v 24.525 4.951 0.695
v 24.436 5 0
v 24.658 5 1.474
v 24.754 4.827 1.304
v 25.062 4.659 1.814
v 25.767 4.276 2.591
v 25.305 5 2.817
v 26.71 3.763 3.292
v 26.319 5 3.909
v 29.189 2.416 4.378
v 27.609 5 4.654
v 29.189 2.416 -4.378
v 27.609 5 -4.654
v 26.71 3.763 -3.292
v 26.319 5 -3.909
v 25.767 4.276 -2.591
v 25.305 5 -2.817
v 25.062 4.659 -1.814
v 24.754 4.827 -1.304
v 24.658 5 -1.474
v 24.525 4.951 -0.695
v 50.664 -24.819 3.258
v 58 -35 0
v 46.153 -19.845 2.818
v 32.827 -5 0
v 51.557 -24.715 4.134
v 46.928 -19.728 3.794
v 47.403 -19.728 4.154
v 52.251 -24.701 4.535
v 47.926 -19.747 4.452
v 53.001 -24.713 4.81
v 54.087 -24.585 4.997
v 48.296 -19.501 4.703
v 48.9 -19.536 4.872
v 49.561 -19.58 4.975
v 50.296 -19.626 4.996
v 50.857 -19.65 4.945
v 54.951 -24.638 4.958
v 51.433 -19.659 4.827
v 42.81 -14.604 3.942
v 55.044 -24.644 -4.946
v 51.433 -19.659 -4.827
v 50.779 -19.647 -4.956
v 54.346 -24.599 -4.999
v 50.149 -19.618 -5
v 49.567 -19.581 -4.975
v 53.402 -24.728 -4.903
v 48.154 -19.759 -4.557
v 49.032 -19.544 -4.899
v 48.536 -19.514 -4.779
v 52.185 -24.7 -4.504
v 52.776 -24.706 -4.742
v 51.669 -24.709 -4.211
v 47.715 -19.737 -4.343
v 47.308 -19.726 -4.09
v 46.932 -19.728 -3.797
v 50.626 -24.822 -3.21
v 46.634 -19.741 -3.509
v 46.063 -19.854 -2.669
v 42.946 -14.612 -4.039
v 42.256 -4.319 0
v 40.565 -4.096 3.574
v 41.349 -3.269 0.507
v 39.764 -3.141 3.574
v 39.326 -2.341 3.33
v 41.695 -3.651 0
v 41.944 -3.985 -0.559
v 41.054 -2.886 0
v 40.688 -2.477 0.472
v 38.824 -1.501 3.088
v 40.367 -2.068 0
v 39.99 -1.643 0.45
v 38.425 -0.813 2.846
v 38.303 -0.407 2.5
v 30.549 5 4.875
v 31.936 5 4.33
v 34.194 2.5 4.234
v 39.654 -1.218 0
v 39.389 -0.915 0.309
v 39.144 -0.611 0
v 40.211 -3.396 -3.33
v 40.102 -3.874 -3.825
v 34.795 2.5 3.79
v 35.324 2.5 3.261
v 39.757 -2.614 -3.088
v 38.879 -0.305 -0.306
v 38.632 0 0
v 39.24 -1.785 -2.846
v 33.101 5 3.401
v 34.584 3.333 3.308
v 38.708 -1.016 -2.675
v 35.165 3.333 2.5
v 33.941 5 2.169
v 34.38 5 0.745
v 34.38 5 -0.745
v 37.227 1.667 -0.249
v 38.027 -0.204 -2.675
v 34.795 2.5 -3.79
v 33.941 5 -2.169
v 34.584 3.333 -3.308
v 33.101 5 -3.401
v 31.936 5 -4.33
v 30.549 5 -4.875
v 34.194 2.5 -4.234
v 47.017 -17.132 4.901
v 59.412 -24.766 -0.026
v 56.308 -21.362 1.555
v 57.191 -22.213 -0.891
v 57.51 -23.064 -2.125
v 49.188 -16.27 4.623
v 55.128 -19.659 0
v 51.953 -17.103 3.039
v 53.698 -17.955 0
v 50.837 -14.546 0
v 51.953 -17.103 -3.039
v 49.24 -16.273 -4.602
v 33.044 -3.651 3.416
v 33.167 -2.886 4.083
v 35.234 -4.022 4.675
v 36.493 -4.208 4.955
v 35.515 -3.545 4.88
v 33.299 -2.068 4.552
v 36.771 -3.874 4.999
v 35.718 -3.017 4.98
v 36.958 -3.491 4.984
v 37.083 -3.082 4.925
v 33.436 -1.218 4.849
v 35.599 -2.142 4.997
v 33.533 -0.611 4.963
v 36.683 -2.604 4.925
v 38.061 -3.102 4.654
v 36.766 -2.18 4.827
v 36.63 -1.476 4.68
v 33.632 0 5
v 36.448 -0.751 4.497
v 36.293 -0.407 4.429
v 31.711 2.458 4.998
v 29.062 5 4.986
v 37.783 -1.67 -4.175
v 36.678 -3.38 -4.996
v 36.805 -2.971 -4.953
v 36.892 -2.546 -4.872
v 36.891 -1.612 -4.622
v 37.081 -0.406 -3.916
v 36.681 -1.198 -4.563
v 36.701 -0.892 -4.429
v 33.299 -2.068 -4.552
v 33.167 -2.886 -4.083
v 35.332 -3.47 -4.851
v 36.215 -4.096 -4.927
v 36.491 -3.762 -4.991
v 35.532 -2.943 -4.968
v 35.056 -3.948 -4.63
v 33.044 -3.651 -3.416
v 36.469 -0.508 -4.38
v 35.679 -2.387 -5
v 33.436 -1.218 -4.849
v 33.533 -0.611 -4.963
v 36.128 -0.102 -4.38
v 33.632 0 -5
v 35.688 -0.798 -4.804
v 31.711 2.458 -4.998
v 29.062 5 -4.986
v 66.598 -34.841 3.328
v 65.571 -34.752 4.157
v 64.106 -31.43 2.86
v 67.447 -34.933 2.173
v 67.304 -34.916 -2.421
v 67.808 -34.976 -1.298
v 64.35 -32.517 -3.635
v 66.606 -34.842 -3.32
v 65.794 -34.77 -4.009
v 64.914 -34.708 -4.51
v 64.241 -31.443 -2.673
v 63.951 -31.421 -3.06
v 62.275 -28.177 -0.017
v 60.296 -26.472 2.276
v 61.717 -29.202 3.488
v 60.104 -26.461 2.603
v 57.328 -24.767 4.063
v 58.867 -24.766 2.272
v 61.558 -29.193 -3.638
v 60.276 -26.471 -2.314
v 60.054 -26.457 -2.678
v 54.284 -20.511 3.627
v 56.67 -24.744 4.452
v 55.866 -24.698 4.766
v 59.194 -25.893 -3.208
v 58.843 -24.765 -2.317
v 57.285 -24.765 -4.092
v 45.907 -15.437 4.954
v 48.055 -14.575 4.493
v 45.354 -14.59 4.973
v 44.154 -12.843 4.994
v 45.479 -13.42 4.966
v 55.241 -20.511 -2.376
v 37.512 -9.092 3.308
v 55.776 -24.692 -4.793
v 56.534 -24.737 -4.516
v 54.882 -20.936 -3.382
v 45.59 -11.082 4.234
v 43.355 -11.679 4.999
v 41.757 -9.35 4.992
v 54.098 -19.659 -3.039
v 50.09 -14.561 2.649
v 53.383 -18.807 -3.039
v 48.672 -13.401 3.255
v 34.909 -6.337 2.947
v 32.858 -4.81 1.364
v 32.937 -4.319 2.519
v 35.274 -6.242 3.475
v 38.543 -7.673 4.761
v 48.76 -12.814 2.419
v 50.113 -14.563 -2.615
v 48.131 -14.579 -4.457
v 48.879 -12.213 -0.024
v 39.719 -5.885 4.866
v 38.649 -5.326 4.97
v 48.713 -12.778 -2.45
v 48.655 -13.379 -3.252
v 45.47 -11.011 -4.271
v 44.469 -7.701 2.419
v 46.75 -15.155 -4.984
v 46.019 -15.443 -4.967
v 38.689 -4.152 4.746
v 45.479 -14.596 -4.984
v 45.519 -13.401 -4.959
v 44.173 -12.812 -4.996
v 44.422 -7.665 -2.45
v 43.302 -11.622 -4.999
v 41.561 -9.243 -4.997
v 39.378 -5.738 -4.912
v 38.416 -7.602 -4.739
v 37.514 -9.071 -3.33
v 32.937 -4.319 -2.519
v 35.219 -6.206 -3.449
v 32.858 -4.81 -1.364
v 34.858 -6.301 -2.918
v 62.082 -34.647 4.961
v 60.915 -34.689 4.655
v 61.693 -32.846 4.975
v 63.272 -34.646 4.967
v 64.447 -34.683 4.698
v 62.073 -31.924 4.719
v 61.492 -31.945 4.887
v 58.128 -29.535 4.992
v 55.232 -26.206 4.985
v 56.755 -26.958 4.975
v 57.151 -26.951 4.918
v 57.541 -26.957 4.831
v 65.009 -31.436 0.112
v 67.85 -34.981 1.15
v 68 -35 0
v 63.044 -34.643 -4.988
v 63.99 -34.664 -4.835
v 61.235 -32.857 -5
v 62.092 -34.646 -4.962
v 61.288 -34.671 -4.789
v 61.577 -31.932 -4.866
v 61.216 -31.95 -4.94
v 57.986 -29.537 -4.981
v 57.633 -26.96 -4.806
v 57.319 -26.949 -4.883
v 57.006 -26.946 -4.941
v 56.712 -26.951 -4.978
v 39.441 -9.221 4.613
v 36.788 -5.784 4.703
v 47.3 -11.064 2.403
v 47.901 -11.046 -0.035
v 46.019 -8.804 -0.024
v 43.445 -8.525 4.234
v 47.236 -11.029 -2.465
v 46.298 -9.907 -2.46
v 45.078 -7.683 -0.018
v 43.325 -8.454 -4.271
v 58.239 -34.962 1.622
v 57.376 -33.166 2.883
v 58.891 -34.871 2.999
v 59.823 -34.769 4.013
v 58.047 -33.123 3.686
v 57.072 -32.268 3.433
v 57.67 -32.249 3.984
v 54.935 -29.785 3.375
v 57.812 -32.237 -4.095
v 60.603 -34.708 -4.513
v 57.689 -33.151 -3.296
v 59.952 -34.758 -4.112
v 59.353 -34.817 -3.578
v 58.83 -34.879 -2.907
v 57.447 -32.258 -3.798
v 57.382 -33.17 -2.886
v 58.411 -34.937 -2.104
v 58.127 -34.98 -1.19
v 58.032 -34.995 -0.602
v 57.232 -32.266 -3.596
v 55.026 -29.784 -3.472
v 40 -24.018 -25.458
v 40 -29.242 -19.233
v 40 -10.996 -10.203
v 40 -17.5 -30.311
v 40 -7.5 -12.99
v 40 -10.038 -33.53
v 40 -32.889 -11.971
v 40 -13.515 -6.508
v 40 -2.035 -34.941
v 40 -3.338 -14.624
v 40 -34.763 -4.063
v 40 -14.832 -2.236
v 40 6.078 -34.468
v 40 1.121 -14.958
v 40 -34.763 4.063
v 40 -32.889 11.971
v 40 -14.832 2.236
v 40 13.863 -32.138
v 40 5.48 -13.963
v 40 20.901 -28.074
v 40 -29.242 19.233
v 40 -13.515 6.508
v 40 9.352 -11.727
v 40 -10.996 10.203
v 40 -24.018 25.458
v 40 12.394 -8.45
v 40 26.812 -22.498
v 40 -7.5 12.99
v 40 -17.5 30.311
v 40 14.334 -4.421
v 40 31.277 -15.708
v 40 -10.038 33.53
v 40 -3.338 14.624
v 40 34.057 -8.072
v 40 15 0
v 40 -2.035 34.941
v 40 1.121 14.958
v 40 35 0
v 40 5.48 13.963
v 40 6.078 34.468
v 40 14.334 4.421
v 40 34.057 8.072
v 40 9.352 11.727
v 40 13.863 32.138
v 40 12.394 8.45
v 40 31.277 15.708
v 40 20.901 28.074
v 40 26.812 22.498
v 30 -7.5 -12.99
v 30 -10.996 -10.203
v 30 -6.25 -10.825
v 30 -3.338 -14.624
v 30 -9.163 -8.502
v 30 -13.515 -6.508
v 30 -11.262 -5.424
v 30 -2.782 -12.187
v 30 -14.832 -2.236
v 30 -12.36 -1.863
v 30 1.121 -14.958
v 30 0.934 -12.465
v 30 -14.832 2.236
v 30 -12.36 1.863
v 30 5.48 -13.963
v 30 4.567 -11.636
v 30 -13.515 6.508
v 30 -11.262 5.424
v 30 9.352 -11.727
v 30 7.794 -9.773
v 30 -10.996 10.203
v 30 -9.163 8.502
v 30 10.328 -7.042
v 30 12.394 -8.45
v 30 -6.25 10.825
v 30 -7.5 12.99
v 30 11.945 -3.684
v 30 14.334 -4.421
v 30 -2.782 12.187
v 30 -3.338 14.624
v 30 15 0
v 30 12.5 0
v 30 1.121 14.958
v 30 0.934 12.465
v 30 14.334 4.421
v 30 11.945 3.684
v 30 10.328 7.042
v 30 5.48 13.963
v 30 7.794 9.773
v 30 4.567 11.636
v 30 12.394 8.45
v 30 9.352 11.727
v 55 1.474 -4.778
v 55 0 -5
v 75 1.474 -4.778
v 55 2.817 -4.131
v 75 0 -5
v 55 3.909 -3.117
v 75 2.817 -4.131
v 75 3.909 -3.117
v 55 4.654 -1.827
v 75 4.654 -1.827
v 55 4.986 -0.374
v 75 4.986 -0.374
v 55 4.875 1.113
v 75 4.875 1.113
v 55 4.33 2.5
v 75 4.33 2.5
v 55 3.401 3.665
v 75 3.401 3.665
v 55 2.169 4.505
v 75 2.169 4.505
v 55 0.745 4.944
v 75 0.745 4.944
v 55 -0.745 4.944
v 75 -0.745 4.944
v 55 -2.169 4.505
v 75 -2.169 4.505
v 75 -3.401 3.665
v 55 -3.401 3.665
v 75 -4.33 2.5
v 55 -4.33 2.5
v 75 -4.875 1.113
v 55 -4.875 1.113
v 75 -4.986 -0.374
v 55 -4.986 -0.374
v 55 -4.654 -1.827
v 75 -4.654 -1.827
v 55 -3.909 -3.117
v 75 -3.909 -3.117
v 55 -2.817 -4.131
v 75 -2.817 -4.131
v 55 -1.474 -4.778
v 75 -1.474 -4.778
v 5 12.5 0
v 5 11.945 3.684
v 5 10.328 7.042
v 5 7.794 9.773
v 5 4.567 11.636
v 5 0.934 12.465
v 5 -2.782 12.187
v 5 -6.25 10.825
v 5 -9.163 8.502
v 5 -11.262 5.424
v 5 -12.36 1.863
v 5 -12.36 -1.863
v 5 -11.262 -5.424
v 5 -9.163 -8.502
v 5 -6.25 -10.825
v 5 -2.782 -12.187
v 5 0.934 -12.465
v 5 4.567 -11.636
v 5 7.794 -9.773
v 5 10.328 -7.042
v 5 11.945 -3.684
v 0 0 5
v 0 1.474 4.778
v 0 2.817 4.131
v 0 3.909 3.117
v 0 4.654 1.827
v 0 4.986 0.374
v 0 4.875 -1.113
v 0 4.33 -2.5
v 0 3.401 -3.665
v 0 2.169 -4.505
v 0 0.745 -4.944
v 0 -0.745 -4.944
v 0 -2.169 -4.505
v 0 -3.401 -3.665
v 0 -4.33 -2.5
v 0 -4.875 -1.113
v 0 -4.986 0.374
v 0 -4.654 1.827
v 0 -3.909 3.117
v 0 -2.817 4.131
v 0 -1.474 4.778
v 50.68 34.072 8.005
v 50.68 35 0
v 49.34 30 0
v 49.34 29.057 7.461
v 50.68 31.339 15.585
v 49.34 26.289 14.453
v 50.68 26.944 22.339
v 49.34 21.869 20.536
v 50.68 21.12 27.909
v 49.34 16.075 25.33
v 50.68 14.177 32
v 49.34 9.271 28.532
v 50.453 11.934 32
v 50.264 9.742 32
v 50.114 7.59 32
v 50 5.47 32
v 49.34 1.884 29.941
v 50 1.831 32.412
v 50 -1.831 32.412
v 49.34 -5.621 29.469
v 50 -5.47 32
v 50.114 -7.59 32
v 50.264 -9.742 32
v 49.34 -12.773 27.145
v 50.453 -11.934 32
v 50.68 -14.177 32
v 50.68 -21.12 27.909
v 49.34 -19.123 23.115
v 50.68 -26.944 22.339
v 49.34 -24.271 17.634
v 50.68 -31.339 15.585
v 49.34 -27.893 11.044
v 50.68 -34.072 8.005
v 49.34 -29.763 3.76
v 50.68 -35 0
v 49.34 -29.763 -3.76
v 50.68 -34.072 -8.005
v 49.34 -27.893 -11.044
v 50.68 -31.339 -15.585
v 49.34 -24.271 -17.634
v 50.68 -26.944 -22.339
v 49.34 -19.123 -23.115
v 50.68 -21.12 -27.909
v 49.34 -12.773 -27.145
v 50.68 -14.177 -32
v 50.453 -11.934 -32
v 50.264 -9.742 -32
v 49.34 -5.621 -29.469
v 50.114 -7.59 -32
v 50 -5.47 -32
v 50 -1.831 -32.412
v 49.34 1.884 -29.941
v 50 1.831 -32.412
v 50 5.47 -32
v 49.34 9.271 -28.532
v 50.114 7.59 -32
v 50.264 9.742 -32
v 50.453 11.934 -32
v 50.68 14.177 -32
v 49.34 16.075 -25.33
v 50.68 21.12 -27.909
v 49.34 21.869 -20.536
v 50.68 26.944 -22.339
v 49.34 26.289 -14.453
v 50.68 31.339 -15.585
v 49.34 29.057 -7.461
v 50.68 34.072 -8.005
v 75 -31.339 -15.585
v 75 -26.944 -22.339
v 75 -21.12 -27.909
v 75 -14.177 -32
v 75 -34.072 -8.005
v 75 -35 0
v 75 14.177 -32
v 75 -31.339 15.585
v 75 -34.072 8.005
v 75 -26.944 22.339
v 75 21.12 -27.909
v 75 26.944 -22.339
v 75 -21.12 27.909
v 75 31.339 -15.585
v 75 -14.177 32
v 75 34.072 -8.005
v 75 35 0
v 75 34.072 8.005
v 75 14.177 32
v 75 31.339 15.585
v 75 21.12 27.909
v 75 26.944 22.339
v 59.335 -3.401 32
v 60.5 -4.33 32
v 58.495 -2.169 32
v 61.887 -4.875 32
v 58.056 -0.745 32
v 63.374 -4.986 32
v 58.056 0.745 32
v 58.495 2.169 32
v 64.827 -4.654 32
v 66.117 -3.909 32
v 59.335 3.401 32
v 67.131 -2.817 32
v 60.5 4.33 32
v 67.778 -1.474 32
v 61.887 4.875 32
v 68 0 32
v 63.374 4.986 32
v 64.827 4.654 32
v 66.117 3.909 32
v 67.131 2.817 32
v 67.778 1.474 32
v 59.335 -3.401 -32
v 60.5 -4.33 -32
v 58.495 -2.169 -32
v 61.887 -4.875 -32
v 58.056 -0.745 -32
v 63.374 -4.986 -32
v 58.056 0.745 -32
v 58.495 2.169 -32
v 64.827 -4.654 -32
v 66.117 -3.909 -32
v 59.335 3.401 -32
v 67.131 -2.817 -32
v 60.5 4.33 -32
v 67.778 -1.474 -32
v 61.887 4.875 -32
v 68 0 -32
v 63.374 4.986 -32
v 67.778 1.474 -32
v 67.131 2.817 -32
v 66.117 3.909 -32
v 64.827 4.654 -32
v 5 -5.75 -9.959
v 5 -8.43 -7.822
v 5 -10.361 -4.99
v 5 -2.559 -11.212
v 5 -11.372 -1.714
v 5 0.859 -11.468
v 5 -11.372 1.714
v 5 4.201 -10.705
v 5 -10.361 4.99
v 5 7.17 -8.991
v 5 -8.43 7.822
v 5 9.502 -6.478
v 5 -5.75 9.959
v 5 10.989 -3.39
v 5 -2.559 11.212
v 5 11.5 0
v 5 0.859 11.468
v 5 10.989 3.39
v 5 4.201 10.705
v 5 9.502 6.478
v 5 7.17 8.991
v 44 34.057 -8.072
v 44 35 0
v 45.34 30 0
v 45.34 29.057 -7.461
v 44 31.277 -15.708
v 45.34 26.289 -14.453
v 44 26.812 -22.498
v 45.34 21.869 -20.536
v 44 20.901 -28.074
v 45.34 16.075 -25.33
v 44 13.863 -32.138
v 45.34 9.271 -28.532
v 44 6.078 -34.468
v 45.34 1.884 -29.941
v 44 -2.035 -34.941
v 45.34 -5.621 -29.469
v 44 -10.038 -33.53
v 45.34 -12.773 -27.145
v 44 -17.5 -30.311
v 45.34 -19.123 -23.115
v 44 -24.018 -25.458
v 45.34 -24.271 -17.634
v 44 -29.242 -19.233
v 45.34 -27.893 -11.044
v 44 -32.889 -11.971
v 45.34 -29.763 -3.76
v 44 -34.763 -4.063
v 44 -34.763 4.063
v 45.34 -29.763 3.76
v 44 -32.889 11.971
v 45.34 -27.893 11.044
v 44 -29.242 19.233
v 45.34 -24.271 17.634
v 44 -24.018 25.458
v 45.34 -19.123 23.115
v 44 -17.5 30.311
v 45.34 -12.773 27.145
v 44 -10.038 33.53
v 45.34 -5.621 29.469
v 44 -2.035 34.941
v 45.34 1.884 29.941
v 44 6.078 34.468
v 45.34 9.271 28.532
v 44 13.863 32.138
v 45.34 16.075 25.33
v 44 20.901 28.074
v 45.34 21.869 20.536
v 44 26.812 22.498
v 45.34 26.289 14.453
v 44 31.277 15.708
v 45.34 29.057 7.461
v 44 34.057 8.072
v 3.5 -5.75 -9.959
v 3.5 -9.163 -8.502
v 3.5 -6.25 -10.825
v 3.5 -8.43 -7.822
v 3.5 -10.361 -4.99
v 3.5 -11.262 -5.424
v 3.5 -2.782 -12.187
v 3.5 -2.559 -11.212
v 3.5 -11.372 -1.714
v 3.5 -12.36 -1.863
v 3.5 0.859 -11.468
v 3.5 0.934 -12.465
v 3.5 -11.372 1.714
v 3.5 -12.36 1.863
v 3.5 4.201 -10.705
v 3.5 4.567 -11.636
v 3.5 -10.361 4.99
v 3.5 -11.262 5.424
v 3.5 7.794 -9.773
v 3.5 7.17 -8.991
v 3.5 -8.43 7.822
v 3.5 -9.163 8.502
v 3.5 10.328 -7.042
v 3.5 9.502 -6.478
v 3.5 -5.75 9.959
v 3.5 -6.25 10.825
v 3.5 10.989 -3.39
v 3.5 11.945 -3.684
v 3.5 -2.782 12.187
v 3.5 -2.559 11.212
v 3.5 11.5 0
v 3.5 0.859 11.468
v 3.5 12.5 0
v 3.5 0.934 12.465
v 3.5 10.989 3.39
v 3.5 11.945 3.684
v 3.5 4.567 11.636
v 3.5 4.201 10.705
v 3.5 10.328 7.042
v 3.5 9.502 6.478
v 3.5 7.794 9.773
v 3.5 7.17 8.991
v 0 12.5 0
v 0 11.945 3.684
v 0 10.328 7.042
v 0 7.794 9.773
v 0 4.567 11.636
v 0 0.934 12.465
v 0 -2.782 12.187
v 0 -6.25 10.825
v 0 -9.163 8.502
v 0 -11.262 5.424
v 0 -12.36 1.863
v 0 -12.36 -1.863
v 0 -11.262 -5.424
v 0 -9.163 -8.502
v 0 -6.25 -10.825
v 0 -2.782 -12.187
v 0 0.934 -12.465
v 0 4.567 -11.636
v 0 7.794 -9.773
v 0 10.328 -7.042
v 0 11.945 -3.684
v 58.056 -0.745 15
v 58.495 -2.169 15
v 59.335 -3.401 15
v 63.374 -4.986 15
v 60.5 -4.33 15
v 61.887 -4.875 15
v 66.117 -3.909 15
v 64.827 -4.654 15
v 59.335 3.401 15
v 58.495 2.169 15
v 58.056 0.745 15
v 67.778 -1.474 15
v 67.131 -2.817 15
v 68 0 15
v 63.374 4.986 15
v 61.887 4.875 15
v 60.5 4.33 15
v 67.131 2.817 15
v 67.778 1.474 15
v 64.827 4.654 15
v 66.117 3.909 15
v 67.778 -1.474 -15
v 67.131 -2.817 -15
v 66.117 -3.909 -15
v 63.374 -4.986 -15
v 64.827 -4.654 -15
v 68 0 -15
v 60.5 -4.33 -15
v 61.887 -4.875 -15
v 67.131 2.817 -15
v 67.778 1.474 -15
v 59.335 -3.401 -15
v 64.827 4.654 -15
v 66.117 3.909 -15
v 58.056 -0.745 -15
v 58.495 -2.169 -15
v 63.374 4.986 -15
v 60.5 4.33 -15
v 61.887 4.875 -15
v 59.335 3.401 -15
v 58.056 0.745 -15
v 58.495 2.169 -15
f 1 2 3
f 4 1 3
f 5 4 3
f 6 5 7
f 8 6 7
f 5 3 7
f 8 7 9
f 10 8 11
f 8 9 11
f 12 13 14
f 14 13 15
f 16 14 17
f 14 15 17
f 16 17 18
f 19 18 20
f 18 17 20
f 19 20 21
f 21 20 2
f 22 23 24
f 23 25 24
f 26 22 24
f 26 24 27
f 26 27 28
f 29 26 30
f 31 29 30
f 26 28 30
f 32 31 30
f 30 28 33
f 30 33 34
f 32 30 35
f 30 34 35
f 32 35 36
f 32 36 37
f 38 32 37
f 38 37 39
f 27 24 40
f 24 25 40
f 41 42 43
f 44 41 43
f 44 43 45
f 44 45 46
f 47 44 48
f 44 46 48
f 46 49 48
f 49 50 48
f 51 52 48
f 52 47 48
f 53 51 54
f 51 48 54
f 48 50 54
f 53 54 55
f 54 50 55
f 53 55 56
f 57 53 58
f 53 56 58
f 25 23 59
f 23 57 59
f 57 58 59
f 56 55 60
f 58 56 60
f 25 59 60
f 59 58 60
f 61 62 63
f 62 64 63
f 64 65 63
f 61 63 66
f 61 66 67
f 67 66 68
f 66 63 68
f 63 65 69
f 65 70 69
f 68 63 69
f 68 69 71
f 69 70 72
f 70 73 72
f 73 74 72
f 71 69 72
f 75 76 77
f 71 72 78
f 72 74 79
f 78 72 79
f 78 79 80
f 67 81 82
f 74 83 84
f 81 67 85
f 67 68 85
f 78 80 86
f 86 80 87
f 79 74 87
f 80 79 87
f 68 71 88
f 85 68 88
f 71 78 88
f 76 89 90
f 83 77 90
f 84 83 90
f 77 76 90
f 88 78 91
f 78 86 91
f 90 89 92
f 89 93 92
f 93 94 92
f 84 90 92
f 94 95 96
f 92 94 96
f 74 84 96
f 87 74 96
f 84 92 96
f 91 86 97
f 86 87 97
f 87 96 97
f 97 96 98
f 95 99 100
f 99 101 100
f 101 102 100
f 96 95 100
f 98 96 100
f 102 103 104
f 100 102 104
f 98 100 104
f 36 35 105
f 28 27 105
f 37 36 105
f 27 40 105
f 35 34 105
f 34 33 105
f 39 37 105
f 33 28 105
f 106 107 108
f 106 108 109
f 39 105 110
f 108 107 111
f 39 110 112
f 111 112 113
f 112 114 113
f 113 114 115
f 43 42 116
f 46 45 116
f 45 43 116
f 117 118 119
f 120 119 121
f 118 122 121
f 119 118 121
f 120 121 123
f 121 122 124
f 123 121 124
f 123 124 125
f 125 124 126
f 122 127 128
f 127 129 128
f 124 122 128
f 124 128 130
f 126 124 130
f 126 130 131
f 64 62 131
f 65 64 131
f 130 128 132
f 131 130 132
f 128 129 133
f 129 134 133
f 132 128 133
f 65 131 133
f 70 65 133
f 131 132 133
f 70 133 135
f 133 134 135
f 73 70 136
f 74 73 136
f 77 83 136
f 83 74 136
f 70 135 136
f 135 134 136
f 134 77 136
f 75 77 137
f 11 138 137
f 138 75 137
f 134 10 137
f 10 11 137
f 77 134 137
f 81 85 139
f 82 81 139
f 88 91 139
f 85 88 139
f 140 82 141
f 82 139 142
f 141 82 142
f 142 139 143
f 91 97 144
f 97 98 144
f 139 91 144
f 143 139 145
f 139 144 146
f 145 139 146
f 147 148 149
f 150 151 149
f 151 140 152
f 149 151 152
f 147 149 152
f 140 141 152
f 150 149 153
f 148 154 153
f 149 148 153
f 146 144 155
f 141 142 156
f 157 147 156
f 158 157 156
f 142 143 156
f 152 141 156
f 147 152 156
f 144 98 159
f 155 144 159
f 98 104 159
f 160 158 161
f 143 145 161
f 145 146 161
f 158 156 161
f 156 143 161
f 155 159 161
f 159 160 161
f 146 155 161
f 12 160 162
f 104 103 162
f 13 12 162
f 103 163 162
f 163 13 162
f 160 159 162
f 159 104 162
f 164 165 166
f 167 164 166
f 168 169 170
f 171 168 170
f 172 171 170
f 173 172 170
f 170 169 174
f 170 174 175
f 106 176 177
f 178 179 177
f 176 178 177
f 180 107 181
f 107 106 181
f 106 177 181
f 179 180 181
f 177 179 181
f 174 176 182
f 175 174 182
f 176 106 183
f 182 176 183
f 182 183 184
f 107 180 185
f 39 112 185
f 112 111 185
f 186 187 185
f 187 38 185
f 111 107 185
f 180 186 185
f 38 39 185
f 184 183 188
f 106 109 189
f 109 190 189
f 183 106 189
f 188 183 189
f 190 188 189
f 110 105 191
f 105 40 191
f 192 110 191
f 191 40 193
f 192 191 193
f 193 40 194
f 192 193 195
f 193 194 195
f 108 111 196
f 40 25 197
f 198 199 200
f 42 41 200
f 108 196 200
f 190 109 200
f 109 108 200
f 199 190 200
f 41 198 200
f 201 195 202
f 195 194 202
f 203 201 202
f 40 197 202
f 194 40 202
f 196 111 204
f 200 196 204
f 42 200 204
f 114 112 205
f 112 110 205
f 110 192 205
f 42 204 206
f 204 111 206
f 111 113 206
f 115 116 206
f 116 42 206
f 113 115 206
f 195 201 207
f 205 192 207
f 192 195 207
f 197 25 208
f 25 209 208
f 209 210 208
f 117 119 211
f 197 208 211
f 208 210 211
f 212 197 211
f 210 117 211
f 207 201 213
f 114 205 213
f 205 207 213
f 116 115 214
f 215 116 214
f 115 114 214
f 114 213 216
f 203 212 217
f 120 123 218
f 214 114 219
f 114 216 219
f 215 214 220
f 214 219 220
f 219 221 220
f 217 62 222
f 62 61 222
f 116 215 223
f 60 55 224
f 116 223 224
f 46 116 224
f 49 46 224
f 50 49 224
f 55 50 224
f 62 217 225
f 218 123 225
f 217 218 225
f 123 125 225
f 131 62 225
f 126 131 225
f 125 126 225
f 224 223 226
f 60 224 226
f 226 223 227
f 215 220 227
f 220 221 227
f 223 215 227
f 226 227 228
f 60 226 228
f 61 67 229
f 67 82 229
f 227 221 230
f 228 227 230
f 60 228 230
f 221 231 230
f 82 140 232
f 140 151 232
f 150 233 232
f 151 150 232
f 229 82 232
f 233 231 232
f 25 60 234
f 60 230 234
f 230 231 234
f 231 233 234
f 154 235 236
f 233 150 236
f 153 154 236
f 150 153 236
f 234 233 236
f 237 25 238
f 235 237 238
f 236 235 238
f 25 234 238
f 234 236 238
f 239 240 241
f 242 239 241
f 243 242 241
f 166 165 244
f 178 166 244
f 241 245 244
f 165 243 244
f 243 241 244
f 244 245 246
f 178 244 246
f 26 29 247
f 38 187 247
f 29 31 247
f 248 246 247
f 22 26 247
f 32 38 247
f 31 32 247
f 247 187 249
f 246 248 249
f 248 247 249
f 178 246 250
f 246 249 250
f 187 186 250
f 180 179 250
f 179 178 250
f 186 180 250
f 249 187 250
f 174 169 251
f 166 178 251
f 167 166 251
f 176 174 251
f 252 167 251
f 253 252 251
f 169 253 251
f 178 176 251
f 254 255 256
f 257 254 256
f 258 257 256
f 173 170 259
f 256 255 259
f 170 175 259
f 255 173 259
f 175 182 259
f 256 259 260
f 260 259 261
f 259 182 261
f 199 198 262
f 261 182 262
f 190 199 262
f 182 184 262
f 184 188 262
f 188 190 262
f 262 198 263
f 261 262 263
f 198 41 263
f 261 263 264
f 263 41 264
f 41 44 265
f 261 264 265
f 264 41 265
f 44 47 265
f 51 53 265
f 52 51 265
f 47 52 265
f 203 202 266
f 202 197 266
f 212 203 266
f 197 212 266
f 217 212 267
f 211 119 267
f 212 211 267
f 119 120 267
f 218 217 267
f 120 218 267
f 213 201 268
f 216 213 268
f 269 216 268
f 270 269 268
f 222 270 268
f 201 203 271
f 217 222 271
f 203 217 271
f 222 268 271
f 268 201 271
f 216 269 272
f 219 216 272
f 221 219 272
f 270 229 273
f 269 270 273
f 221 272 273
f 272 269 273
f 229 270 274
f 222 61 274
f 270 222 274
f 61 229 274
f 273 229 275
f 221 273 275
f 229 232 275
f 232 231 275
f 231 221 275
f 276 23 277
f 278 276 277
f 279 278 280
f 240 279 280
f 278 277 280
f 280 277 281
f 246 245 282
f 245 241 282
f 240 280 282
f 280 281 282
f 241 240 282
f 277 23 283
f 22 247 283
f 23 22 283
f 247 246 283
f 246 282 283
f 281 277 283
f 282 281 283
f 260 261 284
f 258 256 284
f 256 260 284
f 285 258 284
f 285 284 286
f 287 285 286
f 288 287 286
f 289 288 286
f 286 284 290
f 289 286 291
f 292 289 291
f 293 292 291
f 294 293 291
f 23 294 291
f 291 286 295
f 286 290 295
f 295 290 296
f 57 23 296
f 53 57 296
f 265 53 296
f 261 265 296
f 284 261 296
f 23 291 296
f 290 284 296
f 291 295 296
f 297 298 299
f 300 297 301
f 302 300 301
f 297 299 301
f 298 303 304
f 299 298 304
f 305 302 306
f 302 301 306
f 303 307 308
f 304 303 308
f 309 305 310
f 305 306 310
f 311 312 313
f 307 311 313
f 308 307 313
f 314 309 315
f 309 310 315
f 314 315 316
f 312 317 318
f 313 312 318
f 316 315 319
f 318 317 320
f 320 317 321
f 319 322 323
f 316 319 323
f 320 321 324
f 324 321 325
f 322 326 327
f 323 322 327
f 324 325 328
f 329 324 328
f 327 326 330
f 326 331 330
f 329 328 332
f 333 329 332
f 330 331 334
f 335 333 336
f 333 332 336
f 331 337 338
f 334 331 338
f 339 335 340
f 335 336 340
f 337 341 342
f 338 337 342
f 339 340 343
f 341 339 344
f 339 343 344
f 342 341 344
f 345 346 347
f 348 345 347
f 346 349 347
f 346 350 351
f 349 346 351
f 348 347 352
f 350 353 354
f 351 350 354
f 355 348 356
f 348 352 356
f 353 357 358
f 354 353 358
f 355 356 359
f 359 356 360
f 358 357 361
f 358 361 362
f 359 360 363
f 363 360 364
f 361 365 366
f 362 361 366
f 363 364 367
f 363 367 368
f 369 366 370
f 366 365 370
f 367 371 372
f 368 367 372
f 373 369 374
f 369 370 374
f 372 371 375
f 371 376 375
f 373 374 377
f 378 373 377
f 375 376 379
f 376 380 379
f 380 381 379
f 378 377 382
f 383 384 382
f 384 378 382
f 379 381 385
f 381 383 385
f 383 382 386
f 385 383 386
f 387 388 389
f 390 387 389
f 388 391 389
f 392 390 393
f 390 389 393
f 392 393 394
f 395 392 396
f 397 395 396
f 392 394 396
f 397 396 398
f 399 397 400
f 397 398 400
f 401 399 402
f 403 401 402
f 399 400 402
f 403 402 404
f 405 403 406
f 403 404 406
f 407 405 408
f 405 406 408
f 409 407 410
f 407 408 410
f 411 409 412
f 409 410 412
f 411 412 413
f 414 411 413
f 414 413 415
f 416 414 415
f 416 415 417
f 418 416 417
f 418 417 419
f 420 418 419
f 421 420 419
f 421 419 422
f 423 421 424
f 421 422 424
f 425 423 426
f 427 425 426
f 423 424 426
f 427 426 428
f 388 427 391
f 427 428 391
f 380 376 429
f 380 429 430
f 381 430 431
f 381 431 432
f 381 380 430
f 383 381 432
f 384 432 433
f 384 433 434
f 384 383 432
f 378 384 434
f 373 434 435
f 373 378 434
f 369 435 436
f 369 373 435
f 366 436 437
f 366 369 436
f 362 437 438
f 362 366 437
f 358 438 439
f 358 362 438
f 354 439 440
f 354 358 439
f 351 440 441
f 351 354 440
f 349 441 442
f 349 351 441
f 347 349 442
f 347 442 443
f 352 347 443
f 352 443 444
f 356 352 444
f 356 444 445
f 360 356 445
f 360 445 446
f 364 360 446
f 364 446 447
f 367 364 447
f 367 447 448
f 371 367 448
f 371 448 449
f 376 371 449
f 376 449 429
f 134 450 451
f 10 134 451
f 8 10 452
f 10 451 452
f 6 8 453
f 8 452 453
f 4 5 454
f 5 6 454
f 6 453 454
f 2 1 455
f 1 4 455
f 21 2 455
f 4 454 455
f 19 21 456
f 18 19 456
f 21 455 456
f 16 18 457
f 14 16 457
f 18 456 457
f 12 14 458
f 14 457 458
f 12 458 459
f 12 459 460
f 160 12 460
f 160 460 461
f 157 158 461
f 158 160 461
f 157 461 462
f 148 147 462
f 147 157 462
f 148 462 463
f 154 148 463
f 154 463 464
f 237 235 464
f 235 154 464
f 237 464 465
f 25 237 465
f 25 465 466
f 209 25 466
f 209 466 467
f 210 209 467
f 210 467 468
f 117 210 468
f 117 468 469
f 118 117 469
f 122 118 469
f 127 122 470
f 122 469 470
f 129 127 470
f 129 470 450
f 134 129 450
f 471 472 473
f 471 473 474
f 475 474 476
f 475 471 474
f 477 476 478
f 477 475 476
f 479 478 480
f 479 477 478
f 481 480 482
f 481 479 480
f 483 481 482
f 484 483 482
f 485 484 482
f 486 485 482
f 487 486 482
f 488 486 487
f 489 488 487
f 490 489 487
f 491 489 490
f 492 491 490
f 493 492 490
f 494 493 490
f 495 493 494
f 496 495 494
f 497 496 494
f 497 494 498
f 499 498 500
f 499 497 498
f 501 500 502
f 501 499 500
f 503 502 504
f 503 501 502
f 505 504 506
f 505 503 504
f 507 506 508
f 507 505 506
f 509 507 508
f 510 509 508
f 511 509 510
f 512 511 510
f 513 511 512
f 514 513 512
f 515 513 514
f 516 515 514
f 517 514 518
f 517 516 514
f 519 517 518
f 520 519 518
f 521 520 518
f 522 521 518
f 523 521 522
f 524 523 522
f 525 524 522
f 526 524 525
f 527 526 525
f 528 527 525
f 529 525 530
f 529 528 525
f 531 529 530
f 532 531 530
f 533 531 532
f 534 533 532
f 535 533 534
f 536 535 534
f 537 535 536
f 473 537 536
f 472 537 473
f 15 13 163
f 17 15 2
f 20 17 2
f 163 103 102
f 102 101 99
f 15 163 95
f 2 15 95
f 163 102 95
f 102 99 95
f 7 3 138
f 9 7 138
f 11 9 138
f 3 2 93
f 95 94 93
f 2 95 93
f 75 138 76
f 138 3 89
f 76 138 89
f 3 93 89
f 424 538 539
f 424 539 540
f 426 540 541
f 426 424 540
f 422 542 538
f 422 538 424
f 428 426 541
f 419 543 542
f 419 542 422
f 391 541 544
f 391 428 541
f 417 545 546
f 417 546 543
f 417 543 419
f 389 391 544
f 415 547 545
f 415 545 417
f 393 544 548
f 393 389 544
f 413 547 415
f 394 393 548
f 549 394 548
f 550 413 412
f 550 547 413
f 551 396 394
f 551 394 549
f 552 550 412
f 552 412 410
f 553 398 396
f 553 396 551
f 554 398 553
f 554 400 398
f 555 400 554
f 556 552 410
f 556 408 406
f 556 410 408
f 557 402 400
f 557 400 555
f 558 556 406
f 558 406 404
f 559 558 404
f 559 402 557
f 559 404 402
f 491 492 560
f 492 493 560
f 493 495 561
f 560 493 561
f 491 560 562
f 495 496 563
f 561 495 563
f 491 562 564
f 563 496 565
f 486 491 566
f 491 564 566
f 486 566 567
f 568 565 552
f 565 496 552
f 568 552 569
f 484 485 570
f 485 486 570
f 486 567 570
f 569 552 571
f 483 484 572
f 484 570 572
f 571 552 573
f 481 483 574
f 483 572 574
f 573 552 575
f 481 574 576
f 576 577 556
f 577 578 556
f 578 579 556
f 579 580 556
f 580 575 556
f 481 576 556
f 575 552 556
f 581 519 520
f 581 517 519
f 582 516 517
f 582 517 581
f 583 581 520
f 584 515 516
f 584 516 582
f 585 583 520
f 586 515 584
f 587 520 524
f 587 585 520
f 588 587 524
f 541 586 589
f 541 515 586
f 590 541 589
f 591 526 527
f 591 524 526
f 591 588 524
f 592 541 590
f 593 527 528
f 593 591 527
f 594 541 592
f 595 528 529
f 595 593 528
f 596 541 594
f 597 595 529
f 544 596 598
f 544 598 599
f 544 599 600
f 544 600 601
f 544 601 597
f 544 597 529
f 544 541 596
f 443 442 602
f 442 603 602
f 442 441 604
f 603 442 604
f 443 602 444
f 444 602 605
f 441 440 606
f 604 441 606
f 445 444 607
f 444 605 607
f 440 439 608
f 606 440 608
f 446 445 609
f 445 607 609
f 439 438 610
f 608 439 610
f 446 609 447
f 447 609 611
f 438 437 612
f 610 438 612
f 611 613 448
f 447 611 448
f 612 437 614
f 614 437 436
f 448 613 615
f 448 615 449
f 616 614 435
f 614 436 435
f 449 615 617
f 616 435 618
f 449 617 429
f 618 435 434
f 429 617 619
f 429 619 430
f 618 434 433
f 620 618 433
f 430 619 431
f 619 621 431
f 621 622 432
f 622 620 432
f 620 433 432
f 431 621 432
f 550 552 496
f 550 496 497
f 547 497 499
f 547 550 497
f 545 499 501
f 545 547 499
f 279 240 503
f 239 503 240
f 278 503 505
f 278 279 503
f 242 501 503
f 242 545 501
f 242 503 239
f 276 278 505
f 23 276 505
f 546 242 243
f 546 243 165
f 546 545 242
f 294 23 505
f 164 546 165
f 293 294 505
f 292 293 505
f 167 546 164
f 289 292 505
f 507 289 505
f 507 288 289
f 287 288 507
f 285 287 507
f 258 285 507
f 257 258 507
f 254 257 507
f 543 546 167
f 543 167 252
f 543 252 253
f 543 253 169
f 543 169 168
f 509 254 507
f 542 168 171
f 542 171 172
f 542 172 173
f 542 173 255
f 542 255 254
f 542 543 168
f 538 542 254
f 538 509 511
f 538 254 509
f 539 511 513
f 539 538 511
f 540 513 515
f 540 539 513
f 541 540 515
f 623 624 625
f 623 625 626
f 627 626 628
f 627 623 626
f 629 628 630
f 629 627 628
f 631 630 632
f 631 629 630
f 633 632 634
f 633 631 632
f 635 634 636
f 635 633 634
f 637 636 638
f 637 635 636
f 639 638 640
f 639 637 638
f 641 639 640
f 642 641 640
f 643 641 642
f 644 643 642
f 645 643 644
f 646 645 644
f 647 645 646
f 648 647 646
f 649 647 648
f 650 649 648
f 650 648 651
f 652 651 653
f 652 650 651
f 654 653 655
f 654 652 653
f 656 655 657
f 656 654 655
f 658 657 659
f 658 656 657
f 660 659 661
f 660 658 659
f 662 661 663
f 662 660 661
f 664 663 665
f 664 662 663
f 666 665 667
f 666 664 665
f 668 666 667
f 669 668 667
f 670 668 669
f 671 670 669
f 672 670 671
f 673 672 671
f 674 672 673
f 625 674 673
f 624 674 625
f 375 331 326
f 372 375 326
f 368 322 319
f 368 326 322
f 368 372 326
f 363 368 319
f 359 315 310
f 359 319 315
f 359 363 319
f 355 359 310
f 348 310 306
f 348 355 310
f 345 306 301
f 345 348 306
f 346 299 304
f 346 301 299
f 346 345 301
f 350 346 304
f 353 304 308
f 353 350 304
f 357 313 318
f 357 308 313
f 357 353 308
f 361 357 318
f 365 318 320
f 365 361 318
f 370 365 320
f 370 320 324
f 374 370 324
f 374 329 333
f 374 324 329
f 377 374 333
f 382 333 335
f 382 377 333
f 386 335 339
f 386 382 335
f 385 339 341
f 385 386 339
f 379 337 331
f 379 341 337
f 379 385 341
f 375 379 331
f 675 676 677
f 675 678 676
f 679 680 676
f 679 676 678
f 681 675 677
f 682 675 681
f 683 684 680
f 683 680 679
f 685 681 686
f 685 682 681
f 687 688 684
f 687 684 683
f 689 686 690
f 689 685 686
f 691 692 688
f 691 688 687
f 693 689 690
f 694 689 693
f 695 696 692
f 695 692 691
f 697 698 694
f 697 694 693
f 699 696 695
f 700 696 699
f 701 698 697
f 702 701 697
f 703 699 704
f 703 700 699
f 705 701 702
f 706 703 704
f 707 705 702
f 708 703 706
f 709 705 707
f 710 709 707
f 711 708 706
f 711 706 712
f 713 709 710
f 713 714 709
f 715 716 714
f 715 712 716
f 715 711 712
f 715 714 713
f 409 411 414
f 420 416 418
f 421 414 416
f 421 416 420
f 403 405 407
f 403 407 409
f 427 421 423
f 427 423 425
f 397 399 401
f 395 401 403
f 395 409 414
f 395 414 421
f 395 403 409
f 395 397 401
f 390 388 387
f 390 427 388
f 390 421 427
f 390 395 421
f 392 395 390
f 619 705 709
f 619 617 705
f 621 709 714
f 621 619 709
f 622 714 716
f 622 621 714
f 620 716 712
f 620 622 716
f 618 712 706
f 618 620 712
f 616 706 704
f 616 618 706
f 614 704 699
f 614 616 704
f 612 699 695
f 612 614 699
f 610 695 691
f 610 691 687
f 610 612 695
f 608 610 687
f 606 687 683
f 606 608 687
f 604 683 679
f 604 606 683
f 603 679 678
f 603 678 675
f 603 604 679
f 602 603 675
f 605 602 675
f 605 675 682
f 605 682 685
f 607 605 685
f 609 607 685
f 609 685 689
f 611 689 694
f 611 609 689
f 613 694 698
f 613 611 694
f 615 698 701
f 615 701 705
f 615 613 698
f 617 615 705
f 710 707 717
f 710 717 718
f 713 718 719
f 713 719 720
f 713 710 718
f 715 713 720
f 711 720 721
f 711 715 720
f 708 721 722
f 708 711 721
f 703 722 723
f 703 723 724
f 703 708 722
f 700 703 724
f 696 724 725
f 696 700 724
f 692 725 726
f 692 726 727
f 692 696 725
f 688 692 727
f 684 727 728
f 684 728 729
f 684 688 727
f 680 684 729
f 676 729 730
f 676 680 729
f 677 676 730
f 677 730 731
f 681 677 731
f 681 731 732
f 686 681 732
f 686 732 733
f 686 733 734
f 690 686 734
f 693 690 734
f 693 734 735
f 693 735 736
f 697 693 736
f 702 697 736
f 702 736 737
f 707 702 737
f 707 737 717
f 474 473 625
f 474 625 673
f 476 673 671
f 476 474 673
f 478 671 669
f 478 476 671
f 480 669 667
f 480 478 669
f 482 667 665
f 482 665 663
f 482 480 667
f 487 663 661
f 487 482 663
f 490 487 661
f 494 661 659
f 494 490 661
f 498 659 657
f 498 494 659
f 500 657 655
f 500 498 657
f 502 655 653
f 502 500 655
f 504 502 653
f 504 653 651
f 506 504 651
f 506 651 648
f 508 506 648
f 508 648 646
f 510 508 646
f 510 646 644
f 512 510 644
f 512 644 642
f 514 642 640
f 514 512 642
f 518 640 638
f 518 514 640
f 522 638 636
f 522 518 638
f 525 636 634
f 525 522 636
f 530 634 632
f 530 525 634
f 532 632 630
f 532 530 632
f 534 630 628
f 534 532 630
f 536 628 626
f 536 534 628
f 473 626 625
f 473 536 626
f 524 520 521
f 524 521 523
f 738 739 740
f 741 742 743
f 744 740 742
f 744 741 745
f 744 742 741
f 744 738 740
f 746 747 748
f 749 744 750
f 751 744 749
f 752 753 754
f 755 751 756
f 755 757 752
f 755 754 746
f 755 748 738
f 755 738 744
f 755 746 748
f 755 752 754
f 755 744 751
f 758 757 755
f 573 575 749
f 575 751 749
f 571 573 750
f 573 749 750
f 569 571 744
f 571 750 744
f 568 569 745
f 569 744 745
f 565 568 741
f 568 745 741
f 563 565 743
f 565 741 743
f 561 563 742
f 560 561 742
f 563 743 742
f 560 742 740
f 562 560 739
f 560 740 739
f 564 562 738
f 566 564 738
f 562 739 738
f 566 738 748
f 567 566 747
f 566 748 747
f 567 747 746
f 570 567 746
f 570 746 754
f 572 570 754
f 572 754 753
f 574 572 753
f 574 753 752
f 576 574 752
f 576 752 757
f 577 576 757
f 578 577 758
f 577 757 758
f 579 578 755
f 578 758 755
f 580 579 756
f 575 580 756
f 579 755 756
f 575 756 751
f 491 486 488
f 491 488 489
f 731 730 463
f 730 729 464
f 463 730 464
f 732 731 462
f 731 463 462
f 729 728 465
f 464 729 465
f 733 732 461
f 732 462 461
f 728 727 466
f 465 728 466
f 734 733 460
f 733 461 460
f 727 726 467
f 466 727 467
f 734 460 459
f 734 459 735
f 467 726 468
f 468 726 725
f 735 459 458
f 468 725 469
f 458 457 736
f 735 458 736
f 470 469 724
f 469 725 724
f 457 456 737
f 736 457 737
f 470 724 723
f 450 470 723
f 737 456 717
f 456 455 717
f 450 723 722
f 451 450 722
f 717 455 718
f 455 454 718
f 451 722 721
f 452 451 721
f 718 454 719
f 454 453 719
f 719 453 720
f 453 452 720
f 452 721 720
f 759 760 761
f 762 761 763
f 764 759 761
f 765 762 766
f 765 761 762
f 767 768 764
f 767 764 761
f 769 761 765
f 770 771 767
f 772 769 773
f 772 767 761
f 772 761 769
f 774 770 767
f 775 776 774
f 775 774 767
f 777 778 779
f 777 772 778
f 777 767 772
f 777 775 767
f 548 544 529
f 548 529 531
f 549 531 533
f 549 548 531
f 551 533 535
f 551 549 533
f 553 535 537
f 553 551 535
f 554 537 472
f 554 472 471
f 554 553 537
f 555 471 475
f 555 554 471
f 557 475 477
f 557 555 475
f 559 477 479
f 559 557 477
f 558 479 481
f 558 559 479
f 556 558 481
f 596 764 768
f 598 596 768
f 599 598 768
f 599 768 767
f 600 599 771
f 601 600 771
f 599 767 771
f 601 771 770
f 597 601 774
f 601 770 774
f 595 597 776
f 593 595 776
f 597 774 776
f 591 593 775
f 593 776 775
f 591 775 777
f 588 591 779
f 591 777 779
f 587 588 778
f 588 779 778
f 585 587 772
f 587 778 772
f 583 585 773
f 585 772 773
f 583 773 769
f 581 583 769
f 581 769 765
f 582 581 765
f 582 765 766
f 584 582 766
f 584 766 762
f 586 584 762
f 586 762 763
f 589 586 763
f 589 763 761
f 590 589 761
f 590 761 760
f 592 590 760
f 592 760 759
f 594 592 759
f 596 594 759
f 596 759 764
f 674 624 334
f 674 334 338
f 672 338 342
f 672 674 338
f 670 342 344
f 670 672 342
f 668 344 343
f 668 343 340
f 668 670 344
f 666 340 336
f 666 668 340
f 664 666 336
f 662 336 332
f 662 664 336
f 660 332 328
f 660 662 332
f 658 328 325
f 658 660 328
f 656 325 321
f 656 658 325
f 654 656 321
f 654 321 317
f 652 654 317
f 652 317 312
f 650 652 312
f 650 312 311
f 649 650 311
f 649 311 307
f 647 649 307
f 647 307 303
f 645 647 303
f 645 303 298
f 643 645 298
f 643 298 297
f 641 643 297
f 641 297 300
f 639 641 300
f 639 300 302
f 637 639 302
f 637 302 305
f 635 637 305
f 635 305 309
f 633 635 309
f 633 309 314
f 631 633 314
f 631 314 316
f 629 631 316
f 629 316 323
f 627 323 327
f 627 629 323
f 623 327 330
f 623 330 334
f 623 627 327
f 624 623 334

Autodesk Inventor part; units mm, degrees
ref_plane "YZ Plane" through (0, 0, 0) normal (1, 0, 0) x (0, 1, 0)
sketch "Boceto1" plane through (0, 0, 0) normal (0, 0, 1) x (1, 0, 0)
  line L0 (40, 35) -> (44, 35)
  line L1 (75, 35) -> (75, 0)
  line L2 (40, 12.5) -> (40, 15) construction
  line L3 (0, 0) -> (75, 0)
  line L4 (40, 15) -> (30, 15)
  line L5 (30, 15) -> (30, 12.5)
  line L6 (30, 12.5) -> (40, 12.5) construction
  line L7 (40, 15) -> (40, 35)
  line L8 (3.5, 12.5) -> (3.5, 11.5)
  line L9 (3.5, 11.5) -> (5, 11.5)
  line L10 (5, 11.5) -> (5, 12.5)
  line L11 (5, 12.5) -> (30, 12.5)
  line L12 (3.5, 12.5) -> (5, 12.5) construction
  line L13 (0, 12.5) -> (0, 0)
  line L14 (0, 12.5) -> (3.5, 12.5)
  line L15 (65, 35) -> (65, 0) construction
  line L16 (44, 35) -> (45.3397, 30)
  line L17 (45.3397, 30) -> (49.3397, 30)
  line L18 (49.3397, 30) -> (50.6795, 35)
  line L19 (47.3397, 30) -> (47.3397, 35) construction
  line L20 (47.3397, 35) -> (50.6795, 35) construction
  line L21 (44, 35) -> (47.3397, 35) construction
  line L22 (50.6795, 35) -> (75, 35)
  dimension "d59" = 75
  dimension "d61" = 35
  dimension "d82" = 35
  dimension "d111" = 10
  dimension "d112" = 15
  dimension "d113" = 1.5
  dimension "d114" = 1
  dimension "d115" = 25
  dimension "d130" = 12.5
  dimension "d133" = 10
  dimension "d134" = 2
  dimension "d135" = 105
  dimension "d136" = 105
  dimension "d137" = 5
  dimension "d138" = 4
revolve "Revolución1" add sketch "Boceto1" angle 360 about axis through (0, 0, 0) along (1, 0, 0)
ref_plane "Plano de trabajo3" through (0, 0, 15) normal (0, 0, 1) x (1, 0, 0)
sketch "Boceto3" plane through (0, 0, 15) normal (0, 0, 1) x (1, 0, 0)
  circle A0 centre (63, 0) radius 5
  line L0 (75, -35) -> (75, 35) projected
  point P0 (0, 0)
  dimension "d14" = 5
  dimension "d132" = 12
extrude "Extrusión1" cut sketch "Boceto3" along normal blind 80
mirror "Simetría1" about plane through (0, 0, 0) normal (0, 0, 1) of "Extrusión1"
sketch "Boceto10" plane through (75, 0, 0) normal (1, 0, 0) x (0, 0, -1)
  circle A0 centre (0, 0) radius 45.5
  circle A1 centre (0, 0) radius 12.5 construction
  circle A2 centre (0, 0) radius 5
  dimension "d116" = 91
  dimension "d117" = 10
extrude "Extrusión11" cut sketch "Boceto10" against normal blind 20 contours A2
thread "Rosca5"
thread "Rosca6"
thread "Rosca7"
ref_plane "Plano de trabajo6" through (62.8397, -35, 0) normal (0, 1, 0) x (-1, 0, 0)
sketch "Boceto15" plane through (62.8397, -35, 0) normal (0, 1, 0) x (-1, 0, 0)
  circle A0 centre (-0.1603, 0) radius 5
  line L0 (-12.1603, 35) -> (-12.1603, -35) projected
  point P0 (62.8397, 0)
  dimension "d139" = 10
  dimension "d140" = 12
sketch "Boceto16" plane through (0, 0, 0) normal (0, 0, 1) x (1, 0, 0)
  line L0 (50.6795, -35) -> (75, -35) projected
  line L1 (62.8397, -35) -> (29.2758, 5)
  line L2 (62.8397, -35) -> (62.8397, 5) construction
  point P0 (0, 0)
  dimension "d141" = 40
  dimension "d151" = 5
sweep "Barrido1" cut profiles "Boceto15" path "Boceto16" path curves L1
sketch "Boceto17" plane through (0, 0, 0) normal (-1, 0, 0) x (0, 0, 1)
  circle A0 centre (0, 0) radius 5 projected
  circle A1 centre (0, 0) radius 5
  point P0 (0, 0)
  dimension "d144" = 10
extrude "Extrusión13" cut sketch "Boceto17" against normal up to surface
sketch "Sketch18" plane through (75, 0, 0) normal (1, 0, 0) x (0, 0, -1)
  circle A0 centre (0, 0) radius 35 projected
  line L0 (-32, -14.1774) -> (-32, 14.1774)
  line L1 (32, -14.1774) -> (32, 14.1774)
  point P0 (0, 0)
  dimension "d152" = 32
  dimension "d153" = 32
extrude "Extrusion14" cut sketch "Sketch18" against normal blind 25 contours A0 L1 | L0 A0
properties part number "soporte planetario" material "Acetal Resin, Black"
